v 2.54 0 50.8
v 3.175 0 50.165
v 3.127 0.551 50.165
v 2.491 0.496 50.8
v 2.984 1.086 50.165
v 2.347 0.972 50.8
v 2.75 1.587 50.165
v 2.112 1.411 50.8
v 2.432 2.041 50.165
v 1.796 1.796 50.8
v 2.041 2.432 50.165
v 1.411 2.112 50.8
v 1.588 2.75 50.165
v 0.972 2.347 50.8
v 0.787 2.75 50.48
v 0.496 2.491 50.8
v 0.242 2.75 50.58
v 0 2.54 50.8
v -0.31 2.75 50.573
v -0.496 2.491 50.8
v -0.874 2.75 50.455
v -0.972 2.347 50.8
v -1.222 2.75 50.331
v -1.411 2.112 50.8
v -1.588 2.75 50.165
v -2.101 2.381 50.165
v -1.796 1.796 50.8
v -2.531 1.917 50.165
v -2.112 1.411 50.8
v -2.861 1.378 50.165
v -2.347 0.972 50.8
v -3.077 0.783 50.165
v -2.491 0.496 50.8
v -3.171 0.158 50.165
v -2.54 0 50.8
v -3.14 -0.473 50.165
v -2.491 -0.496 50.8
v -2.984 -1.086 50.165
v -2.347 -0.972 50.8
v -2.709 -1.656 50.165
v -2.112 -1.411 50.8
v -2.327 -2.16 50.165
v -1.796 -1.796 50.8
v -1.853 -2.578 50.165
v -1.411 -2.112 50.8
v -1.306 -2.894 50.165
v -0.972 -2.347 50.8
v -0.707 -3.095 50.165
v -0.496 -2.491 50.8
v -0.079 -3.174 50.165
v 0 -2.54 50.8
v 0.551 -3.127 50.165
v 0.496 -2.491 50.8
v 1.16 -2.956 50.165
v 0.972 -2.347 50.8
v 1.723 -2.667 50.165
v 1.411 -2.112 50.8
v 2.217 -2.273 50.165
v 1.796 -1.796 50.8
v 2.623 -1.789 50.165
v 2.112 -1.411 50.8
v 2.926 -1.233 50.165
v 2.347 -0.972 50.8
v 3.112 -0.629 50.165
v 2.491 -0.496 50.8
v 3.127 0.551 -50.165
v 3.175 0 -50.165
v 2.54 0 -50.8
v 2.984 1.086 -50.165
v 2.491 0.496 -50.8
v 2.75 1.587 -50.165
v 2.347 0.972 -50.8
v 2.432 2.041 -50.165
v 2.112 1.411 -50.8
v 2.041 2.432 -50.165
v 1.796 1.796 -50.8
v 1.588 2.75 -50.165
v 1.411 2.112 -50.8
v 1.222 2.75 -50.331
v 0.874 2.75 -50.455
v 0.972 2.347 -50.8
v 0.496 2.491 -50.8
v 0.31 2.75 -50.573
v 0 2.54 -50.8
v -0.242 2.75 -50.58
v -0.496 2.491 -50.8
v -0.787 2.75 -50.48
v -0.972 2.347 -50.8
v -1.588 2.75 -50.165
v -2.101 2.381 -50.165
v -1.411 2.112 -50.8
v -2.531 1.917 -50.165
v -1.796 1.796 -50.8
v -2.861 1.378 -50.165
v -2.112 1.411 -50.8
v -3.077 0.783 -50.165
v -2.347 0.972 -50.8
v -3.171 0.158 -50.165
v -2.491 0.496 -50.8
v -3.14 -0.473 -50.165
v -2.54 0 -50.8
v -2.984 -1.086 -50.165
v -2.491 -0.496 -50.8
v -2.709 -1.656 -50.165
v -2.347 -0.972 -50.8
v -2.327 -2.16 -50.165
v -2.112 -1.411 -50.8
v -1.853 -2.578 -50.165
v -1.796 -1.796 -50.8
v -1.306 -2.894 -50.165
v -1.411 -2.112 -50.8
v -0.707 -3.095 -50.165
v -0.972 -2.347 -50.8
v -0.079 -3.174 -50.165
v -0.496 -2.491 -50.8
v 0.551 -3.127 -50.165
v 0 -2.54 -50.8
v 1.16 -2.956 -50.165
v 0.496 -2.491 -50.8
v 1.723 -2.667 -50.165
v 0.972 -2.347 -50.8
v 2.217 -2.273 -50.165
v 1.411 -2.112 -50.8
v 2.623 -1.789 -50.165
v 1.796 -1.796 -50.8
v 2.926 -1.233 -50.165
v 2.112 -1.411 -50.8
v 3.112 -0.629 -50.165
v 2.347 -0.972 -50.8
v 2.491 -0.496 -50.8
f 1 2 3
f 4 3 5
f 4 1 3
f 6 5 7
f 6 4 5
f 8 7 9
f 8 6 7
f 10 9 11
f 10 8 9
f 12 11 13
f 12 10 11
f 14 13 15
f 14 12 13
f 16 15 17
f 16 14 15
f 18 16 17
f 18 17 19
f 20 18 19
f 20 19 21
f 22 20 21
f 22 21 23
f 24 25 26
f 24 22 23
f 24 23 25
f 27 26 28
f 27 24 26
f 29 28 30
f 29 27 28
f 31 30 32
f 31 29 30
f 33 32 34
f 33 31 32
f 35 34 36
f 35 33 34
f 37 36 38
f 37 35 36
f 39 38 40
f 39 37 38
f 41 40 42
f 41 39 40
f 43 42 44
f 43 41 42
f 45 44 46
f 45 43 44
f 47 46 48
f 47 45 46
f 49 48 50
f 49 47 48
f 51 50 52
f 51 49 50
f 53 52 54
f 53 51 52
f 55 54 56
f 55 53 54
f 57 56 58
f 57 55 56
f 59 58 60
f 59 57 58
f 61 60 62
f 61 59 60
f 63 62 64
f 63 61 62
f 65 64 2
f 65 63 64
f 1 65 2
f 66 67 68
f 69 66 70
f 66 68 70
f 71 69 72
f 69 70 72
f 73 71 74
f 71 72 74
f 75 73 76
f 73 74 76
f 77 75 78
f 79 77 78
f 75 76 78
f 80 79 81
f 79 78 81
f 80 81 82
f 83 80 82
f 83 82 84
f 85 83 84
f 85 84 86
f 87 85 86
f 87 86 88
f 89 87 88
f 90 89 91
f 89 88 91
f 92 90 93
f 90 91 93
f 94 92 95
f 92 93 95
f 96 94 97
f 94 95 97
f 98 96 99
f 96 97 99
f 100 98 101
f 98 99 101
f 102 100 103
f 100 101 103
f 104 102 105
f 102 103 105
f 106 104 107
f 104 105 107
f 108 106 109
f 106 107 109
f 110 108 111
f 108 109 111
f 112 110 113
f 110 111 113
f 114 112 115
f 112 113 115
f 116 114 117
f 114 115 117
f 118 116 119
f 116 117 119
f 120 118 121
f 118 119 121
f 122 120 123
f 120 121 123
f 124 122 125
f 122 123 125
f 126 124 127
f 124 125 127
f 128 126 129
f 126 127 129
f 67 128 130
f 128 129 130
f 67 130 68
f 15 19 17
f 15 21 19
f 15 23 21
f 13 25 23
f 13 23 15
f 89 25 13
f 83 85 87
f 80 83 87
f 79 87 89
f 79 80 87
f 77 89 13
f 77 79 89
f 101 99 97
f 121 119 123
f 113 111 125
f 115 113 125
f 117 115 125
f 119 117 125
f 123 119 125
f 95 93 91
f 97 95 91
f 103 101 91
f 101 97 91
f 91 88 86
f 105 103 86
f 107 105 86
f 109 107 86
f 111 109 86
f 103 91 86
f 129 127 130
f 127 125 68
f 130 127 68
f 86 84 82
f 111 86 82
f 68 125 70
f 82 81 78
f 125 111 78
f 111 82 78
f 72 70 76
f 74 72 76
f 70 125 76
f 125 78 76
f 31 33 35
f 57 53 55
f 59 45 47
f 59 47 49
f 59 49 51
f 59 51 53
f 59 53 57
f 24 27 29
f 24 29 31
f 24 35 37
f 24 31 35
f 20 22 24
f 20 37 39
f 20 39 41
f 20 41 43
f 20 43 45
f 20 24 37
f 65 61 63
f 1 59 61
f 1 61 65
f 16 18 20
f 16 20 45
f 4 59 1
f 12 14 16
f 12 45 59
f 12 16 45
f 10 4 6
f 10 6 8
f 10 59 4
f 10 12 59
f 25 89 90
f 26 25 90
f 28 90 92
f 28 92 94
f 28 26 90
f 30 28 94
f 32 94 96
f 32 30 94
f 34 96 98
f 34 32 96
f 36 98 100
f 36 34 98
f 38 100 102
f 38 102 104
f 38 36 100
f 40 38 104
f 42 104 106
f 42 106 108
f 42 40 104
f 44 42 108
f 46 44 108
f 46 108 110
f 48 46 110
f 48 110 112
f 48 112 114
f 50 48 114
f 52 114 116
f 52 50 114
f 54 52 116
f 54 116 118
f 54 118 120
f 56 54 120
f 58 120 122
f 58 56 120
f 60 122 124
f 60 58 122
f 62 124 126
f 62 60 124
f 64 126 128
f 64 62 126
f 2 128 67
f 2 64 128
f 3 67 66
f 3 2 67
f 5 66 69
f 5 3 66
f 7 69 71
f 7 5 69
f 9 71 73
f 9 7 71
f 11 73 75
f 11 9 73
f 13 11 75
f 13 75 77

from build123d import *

# Parameters (mm, degrees)
SKETCH1_R           = 3.175
EXTRUDE1_DEPTH      = 50.8
CHAMFER1_SIZE       = 0.635
EXTRUDE7_DEPTH      = 51.998051433
EXTRUDE7_DEPTH_BACK = 51.998051433


with BuildPart() as part:
    # Sketch1 → Extrude1 (new, symmetric)
    with BuildSketch(Plane.XY):
        Circle(SKETCH1_R)
    extrude(amount=EXTRUDE1_DEPTH, both=True)

    # Chamfer1
    chamfer1_edges = [part.edges().sort_by_distance(p)[0] for p in [
        (-3.175, 0, -50.8),
        (-3.175, 0, 50.8),
    ]]
    chamfer(chamfer1_edges, length=CHAMFER1_SIZE)

    # Sketch13 → Extrude7 (cut, two sides: drawn at the far end of the back side and taken through both)
    with BuildSketch(Plane.XY.offset(-EXTRUDE7_DEPTH_BACK)):
        with BuildLine():
            Line((-1.5875, 2.749630657), (1.5875, 2.749630657))
            ThreePointArc((1.5875, 2.749630657), (0, 3.175), (-1.5875, 2.749630657))
        make_face()
    extrude(amount=EXTRUDE7_DEPTH + EXTRUDE7_DEPTH_BACK, mode=Mode.SUBTRACT)


solid = part.part
